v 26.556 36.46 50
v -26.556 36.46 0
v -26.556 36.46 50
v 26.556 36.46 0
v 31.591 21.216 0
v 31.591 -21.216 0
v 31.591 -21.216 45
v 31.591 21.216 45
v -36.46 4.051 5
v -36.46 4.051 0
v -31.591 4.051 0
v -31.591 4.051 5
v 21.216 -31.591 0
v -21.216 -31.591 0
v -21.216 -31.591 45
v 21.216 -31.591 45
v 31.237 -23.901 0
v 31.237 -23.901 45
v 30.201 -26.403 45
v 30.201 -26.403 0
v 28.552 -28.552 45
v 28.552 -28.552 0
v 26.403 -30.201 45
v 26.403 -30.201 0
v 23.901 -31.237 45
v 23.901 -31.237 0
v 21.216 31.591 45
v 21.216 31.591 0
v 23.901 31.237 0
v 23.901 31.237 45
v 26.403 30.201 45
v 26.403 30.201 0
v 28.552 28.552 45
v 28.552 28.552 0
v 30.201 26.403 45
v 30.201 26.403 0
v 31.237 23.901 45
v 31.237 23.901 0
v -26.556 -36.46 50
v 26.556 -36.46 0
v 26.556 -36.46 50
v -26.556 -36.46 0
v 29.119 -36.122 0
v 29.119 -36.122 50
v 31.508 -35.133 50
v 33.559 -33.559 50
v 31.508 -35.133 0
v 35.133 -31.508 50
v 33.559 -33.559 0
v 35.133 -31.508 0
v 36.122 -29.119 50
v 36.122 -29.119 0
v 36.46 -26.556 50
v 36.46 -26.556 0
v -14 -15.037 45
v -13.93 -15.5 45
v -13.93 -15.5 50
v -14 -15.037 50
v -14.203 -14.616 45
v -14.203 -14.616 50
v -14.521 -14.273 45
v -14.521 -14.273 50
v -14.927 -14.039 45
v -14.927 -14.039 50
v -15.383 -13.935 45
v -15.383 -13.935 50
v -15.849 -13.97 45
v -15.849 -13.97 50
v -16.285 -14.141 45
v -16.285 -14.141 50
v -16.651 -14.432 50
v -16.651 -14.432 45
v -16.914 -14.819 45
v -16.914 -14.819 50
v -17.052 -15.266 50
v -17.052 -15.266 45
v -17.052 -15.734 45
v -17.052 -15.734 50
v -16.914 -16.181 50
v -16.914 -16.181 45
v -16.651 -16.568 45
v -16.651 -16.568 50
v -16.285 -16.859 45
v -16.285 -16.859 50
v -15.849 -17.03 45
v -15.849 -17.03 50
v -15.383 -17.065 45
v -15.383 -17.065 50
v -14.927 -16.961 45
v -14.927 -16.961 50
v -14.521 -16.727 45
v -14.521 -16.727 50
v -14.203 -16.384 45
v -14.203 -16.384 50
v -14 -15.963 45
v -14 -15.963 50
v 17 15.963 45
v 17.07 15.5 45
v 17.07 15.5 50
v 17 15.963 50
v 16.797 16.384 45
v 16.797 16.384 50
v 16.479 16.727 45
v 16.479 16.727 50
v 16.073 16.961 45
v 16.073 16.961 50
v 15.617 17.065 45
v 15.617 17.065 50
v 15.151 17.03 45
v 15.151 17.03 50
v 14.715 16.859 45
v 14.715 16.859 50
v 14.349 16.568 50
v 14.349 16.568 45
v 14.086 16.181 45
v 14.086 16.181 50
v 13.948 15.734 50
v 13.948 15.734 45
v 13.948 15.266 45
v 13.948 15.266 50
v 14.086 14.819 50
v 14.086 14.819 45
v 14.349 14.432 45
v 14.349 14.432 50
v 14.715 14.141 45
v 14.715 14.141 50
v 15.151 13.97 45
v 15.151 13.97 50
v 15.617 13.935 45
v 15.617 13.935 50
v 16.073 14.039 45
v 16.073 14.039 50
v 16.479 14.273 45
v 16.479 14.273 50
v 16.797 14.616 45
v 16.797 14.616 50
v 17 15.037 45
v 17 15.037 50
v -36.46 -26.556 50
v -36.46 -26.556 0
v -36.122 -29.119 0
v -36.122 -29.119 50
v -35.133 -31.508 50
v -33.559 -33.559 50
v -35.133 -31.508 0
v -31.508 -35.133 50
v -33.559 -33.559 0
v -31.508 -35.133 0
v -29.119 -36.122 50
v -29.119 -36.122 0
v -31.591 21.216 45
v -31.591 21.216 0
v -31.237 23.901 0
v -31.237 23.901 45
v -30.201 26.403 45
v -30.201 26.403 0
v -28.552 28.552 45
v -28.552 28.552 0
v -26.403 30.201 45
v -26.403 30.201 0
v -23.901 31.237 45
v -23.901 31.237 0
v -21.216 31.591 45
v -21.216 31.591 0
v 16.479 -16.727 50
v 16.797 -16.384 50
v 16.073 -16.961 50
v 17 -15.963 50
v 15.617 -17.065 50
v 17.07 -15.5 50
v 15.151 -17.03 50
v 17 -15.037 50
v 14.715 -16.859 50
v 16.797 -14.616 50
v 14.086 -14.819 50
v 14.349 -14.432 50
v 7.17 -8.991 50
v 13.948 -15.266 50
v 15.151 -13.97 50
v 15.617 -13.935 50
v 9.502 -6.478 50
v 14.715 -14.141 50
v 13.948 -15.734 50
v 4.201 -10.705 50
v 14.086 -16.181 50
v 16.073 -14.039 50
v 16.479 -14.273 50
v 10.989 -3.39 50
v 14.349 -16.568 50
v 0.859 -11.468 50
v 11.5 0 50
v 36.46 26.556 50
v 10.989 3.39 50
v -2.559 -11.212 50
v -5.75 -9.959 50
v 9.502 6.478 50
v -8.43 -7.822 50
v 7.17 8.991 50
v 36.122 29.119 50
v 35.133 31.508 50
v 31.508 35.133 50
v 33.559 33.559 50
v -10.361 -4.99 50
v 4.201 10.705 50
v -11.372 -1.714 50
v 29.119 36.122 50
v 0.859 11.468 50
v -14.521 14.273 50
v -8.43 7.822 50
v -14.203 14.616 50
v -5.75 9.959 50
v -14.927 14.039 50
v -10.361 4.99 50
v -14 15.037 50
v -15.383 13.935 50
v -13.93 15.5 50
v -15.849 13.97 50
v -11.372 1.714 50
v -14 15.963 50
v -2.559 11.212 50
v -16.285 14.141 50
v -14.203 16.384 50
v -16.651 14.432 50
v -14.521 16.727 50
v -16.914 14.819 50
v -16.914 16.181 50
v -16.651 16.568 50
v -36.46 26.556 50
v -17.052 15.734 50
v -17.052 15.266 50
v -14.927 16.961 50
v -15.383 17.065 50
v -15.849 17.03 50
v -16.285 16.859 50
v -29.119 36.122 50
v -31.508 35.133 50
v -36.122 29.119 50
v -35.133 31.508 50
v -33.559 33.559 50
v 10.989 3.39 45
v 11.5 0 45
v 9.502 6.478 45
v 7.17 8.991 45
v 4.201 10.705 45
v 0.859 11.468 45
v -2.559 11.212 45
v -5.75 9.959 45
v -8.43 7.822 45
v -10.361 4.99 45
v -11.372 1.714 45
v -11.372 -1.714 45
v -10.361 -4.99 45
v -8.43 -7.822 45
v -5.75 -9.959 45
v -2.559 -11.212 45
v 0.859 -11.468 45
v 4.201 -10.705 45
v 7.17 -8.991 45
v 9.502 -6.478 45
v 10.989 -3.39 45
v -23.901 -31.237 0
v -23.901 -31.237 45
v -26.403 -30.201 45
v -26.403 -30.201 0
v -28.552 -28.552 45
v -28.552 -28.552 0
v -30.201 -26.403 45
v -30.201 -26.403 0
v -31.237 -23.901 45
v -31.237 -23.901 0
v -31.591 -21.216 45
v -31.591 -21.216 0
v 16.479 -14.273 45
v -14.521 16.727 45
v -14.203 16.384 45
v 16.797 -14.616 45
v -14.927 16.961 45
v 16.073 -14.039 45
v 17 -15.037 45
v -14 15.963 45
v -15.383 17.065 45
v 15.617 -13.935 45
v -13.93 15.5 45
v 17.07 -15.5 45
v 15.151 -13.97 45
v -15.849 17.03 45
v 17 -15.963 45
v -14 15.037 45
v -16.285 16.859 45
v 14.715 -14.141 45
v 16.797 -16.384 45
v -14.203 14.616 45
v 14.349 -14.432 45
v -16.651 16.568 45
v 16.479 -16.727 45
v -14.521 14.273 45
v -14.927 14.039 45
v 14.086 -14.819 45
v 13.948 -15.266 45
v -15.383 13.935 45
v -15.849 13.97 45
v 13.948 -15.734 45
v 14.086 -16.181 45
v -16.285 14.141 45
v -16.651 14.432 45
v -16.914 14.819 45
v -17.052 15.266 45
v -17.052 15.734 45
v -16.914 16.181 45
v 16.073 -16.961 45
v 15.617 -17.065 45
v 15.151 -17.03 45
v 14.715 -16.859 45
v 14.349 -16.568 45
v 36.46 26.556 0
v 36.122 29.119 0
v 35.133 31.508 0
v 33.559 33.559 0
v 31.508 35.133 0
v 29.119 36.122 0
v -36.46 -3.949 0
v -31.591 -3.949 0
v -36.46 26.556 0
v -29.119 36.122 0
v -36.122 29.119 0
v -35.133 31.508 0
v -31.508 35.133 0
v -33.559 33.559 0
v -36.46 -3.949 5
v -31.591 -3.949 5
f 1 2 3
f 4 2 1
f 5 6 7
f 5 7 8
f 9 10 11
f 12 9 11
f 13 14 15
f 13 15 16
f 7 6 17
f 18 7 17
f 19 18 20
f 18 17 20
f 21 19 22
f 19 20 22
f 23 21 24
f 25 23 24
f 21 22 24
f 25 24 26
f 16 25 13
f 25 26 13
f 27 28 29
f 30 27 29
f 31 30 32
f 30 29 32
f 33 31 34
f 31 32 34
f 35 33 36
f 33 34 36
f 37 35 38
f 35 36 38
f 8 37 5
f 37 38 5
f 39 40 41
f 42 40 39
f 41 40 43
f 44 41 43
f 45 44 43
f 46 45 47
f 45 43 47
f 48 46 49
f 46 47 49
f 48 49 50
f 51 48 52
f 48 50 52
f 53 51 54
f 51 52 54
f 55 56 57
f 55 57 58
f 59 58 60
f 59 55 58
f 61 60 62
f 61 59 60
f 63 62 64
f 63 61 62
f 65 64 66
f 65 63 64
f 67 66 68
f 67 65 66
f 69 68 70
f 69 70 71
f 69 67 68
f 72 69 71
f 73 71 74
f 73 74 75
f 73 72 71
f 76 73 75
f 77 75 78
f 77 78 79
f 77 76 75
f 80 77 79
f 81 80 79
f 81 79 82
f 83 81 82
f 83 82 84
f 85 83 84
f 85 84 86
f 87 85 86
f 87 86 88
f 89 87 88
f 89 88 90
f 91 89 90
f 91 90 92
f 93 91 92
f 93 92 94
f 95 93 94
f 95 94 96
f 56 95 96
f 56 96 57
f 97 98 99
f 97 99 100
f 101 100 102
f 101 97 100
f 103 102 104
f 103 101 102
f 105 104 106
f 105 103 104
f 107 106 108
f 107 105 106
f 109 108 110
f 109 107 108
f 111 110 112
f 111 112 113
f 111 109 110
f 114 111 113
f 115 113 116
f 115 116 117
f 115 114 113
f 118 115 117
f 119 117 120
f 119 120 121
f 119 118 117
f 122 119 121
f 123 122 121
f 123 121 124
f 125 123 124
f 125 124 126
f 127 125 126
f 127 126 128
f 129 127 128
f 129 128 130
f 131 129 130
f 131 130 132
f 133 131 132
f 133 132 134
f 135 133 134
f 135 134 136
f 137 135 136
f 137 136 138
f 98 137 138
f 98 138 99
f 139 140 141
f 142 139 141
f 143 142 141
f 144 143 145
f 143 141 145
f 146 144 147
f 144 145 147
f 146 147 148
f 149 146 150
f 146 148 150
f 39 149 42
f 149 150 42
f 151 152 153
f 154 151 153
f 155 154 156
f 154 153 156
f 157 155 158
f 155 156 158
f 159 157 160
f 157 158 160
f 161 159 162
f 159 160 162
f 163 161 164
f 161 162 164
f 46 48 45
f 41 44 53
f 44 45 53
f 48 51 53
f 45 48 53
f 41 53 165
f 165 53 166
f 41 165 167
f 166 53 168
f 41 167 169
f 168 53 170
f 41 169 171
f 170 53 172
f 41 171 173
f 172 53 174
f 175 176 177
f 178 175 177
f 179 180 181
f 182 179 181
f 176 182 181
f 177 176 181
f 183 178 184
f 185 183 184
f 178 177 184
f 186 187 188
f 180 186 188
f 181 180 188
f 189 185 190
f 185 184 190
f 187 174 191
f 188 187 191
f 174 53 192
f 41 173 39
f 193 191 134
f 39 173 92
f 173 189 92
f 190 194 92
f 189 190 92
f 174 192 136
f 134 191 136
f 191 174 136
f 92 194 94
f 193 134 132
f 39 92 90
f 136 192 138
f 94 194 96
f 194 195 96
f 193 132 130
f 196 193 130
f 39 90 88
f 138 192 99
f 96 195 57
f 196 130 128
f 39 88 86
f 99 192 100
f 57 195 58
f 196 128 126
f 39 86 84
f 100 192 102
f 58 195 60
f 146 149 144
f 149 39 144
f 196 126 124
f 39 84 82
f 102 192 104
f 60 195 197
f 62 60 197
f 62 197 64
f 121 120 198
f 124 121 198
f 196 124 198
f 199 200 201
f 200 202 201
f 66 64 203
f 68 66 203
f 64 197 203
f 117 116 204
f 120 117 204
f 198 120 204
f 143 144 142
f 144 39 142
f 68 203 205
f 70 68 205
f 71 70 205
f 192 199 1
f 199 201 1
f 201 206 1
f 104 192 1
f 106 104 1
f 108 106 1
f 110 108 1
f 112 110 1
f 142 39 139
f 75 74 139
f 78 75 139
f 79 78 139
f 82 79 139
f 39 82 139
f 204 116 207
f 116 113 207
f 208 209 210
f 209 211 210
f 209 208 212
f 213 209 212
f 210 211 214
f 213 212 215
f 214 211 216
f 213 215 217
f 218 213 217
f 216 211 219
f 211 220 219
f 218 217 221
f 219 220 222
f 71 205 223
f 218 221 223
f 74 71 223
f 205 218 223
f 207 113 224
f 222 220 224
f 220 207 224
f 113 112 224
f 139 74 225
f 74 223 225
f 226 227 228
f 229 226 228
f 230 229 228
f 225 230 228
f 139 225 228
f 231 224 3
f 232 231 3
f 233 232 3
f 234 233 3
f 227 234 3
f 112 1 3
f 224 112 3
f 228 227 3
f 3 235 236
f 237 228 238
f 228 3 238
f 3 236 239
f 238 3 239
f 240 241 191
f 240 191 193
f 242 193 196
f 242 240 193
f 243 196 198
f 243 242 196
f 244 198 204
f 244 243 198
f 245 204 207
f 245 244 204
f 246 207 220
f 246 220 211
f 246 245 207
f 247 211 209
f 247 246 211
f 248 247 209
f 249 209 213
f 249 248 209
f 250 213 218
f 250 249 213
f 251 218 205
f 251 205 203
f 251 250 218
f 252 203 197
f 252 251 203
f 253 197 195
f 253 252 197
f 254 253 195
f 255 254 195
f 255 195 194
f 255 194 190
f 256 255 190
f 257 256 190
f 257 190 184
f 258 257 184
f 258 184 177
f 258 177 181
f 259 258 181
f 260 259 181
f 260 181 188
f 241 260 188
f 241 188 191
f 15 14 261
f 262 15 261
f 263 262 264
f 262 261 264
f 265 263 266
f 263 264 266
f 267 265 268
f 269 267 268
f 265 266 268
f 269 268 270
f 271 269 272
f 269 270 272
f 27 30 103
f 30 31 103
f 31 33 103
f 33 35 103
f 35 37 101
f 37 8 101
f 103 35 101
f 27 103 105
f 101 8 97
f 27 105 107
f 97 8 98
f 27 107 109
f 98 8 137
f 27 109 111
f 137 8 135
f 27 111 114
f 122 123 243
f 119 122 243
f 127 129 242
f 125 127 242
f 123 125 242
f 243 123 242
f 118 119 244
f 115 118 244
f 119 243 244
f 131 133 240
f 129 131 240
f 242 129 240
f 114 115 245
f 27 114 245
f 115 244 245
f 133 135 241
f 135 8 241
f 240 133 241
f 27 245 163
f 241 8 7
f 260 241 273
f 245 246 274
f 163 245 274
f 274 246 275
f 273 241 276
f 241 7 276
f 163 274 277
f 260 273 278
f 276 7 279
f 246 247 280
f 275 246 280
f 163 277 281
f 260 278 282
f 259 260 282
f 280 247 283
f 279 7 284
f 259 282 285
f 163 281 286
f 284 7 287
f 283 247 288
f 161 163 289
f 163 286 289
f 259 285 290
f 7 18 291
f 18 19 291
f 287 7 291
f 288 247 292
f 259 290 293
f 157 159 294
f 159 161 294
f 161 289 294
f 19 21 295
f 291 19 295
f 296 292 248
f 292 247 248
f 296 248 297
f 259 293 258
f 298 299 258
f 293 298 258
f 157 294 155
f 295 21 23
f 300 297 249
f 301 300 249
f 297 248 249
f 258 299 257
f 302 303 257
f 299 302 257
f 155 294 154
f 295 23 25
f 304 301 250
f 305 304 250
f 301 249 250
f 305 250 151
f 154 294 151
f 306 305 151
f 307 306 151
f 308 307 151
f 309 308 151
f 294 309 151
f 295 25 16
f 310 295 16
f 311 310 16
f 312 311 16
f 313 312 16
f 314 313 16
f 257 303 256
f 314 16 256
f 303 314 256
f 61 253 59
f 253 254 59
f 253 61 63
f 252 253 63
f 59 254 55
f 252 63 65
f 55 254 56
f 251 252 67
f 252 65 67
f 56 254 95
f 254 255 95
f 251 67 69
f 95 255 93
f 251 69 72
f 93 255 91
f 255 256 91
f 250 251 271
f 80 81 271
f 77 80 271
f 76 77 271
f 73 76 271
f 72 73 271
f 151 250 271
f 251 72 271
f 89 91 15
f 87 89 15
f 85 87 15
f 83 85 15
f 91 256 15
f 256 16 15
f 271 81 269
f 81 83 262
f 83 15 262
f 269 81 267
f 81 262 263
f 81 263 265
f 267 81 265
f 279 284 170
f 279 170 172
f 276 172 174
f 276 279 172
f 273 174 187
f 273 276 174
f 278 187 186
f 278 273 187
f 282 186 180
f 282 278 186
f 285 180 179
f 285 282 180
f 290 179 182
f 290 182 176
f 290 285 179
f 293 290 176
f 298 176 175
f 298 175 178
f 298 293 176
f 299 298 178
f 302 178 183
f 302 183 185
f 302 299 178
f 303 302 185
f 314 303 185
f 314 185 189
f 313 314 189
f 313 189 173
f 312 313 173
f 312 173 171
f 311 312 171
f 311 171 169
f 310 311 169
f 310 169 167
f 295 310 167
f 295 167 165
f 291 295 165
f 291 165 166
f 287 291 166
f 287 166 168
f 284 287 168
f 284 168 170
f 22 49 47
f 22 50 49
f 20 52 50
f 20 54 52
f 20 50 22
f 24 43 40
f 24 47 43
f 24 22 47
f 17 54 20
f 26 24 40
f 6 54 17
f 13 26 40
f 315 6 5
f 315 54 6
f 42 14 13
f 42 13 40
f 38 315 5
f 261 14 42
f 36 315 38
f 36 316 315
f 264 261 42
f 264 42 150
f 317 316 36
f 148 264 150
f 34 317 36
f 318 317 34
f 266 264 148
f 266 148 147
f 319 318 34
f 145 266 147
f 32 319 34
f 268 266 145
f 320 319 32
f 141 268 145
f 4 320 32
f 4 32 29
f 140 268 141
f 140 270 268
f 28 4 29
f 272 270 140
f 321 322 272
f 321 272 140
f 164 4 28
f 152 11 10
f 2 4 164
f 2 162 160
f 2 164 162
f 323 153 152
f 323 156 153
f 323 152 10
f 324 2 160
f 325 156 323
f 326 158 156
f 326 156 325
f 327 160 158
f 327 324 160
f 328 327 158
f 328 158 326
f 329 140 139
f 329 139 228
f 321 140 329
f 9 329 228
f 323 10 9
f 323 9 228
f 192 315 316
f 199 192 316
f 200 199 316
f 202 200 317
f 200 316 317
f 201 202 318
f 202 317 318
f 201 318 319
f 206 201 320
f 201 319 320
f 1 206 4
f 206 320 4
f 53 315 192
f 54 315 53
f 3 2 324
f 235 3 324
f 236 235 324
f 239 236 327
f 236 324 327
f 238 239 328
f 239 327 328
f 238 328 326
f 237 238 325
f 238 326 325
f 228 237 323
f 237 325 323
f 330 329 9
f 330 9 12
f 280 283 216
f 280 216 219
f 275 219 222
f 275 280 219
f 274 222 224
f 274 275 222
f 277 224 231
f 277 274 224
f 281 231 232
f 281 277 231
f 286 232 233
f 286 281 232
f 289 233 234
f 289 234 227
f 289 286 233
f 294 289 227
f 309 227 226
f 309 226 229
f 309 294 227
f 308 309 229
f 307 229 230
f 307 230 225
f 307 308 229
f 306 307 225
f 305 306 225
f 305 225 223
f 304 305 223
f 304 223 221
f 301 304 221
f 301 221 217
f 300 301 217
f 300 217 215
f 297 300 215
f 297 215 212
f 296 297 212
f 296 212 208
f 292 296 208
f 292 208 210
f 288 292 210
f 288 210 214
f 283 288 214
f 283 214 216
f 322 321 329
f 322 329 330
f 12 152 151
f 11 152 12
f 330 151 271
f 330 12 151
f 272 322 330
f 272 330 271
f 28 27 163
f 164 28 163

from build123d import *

# Parameters (mm, degrees)
SKETCH_R        = 1.56961
SKETCH_R_2      = 11.5
PAD_DEPTH       = 50
POCKET_DEPTH    = 45
SKETCH002_W     = 4.8693872445
SKETCH002_H     = 8
POCKET001_DEPTH = 5


with BuildPart() as part:
    # Sketch → Pad (new body)
    with BuildSketch(Plane.XY):
        with BuildLine():
            Line((-26.5555397501, 36.4599848379), (26.5555397501, 36.4599848379))
            ThreePointArc((36.4599848378, 26.5555397501), (33.5590400355, 33.5590400355), (26.5555397501, 36.4599848378))
            Line((36.4599848379, 26.5555397501), (36.4599848379, -26.5555397501))
            ThreePointArc((26.5555397501, -36.4599848378), (33.5590400355, -33.5590400355), (36.4599848378, -26.5555397501))
            Line((26.5555397501, -36.4599848379), (-26.5555397501, -36.4599848379))
            ThreePointArc((-36.4599848378, -26.5555397501), (-33.5590400355, -33.5590400355), (-26.5555397501, -36.4599848378))
            Line((-36.4599848379, -26.5555397501), (-36.4599848379, 26.5555397501))
            ThreePointArc((-26.5555397501, 36.4599848378), (-33.5590400355, 33.5590400355), (-36.4599848378, 26.5555397501))
        make_face()
        with Locations((15.5, 15.5)):
            Circle(SKETCH_R, mode=Mode.SUBTRACT)
        with Locations((-15.5, 15.5)):
            Circle(SKETCH_R, mode=Mode.SUBTRACT)
        with Locations((15.5, -15.5)):
            Circle(SKETCH_R, mode=Mode.SUBTRACT)
        with Locations((-15.5, -15.5)):
            Circle(SKETCH_R, mode=Mode.SUBTRACT)
        Circle(SKETCH_R_2, mode=Mode.SUBTRACT)
    extrude(amount=PAD_DEPTH)

    # Sketch001 → Pocket (cut)
    with BuildSketch(Plane(origin=(0, 0, 0), x_dir=(1, 0, 0), z_dir=(0, 0, -1))):
        with BuildLine():
            Line((-21.2160363943, 31.5905975933), (21.2160363942, 31.5905975933))
            ThreePointArc((31.5905975933, 21.2160363942), (28.55195897, 28.55195897), (21.2160363942, 31.5905975933))
            Line((31.5905975933, 21.2160363942), (31.5905975933, -21.2160363942))
            ThreePointArc((21.2160363943, -31.5905975933), (28.55195897, -28.5519589699), (31.5905975933, -21.2160363942))
            Line((21.2160363943, -31.5905975933), (-21.2160363943, -31.5905975933))
            ThreePointArc((-31.5905975933, -21.2160363943), (-28.5519589699, -28.55195897), (-21.2160363942, -31.5905975933))
            Line((-31.5905975933, -21.2160363943), (-31.5905975933, 21.2160363943))
            ThreePointArc((-21.2160363943, 31.5905975933), (-28.55195897, 28.55195897), (-31.5905975933, 21.2160363942))
        make_face()
    extrude(amount=-POCKET_DEPTH, mode=Mode.SUBTRACT)

    # Sketch002 → Pocket001 (cut)
    with BuildSketch(Plane(origin=(0, 0, 0), x_dir=(1, 0, 0), z_dir=(0, 0, -1))):
        with Locations((-34.0252912156, -0.0510141845)):
            Rectangle(SKETCH002_W, SKETCH002_H)
    extrude(amount=-POCKET001_DEPTH, mode=Mode.SUBTRACT)


solid = part.part
